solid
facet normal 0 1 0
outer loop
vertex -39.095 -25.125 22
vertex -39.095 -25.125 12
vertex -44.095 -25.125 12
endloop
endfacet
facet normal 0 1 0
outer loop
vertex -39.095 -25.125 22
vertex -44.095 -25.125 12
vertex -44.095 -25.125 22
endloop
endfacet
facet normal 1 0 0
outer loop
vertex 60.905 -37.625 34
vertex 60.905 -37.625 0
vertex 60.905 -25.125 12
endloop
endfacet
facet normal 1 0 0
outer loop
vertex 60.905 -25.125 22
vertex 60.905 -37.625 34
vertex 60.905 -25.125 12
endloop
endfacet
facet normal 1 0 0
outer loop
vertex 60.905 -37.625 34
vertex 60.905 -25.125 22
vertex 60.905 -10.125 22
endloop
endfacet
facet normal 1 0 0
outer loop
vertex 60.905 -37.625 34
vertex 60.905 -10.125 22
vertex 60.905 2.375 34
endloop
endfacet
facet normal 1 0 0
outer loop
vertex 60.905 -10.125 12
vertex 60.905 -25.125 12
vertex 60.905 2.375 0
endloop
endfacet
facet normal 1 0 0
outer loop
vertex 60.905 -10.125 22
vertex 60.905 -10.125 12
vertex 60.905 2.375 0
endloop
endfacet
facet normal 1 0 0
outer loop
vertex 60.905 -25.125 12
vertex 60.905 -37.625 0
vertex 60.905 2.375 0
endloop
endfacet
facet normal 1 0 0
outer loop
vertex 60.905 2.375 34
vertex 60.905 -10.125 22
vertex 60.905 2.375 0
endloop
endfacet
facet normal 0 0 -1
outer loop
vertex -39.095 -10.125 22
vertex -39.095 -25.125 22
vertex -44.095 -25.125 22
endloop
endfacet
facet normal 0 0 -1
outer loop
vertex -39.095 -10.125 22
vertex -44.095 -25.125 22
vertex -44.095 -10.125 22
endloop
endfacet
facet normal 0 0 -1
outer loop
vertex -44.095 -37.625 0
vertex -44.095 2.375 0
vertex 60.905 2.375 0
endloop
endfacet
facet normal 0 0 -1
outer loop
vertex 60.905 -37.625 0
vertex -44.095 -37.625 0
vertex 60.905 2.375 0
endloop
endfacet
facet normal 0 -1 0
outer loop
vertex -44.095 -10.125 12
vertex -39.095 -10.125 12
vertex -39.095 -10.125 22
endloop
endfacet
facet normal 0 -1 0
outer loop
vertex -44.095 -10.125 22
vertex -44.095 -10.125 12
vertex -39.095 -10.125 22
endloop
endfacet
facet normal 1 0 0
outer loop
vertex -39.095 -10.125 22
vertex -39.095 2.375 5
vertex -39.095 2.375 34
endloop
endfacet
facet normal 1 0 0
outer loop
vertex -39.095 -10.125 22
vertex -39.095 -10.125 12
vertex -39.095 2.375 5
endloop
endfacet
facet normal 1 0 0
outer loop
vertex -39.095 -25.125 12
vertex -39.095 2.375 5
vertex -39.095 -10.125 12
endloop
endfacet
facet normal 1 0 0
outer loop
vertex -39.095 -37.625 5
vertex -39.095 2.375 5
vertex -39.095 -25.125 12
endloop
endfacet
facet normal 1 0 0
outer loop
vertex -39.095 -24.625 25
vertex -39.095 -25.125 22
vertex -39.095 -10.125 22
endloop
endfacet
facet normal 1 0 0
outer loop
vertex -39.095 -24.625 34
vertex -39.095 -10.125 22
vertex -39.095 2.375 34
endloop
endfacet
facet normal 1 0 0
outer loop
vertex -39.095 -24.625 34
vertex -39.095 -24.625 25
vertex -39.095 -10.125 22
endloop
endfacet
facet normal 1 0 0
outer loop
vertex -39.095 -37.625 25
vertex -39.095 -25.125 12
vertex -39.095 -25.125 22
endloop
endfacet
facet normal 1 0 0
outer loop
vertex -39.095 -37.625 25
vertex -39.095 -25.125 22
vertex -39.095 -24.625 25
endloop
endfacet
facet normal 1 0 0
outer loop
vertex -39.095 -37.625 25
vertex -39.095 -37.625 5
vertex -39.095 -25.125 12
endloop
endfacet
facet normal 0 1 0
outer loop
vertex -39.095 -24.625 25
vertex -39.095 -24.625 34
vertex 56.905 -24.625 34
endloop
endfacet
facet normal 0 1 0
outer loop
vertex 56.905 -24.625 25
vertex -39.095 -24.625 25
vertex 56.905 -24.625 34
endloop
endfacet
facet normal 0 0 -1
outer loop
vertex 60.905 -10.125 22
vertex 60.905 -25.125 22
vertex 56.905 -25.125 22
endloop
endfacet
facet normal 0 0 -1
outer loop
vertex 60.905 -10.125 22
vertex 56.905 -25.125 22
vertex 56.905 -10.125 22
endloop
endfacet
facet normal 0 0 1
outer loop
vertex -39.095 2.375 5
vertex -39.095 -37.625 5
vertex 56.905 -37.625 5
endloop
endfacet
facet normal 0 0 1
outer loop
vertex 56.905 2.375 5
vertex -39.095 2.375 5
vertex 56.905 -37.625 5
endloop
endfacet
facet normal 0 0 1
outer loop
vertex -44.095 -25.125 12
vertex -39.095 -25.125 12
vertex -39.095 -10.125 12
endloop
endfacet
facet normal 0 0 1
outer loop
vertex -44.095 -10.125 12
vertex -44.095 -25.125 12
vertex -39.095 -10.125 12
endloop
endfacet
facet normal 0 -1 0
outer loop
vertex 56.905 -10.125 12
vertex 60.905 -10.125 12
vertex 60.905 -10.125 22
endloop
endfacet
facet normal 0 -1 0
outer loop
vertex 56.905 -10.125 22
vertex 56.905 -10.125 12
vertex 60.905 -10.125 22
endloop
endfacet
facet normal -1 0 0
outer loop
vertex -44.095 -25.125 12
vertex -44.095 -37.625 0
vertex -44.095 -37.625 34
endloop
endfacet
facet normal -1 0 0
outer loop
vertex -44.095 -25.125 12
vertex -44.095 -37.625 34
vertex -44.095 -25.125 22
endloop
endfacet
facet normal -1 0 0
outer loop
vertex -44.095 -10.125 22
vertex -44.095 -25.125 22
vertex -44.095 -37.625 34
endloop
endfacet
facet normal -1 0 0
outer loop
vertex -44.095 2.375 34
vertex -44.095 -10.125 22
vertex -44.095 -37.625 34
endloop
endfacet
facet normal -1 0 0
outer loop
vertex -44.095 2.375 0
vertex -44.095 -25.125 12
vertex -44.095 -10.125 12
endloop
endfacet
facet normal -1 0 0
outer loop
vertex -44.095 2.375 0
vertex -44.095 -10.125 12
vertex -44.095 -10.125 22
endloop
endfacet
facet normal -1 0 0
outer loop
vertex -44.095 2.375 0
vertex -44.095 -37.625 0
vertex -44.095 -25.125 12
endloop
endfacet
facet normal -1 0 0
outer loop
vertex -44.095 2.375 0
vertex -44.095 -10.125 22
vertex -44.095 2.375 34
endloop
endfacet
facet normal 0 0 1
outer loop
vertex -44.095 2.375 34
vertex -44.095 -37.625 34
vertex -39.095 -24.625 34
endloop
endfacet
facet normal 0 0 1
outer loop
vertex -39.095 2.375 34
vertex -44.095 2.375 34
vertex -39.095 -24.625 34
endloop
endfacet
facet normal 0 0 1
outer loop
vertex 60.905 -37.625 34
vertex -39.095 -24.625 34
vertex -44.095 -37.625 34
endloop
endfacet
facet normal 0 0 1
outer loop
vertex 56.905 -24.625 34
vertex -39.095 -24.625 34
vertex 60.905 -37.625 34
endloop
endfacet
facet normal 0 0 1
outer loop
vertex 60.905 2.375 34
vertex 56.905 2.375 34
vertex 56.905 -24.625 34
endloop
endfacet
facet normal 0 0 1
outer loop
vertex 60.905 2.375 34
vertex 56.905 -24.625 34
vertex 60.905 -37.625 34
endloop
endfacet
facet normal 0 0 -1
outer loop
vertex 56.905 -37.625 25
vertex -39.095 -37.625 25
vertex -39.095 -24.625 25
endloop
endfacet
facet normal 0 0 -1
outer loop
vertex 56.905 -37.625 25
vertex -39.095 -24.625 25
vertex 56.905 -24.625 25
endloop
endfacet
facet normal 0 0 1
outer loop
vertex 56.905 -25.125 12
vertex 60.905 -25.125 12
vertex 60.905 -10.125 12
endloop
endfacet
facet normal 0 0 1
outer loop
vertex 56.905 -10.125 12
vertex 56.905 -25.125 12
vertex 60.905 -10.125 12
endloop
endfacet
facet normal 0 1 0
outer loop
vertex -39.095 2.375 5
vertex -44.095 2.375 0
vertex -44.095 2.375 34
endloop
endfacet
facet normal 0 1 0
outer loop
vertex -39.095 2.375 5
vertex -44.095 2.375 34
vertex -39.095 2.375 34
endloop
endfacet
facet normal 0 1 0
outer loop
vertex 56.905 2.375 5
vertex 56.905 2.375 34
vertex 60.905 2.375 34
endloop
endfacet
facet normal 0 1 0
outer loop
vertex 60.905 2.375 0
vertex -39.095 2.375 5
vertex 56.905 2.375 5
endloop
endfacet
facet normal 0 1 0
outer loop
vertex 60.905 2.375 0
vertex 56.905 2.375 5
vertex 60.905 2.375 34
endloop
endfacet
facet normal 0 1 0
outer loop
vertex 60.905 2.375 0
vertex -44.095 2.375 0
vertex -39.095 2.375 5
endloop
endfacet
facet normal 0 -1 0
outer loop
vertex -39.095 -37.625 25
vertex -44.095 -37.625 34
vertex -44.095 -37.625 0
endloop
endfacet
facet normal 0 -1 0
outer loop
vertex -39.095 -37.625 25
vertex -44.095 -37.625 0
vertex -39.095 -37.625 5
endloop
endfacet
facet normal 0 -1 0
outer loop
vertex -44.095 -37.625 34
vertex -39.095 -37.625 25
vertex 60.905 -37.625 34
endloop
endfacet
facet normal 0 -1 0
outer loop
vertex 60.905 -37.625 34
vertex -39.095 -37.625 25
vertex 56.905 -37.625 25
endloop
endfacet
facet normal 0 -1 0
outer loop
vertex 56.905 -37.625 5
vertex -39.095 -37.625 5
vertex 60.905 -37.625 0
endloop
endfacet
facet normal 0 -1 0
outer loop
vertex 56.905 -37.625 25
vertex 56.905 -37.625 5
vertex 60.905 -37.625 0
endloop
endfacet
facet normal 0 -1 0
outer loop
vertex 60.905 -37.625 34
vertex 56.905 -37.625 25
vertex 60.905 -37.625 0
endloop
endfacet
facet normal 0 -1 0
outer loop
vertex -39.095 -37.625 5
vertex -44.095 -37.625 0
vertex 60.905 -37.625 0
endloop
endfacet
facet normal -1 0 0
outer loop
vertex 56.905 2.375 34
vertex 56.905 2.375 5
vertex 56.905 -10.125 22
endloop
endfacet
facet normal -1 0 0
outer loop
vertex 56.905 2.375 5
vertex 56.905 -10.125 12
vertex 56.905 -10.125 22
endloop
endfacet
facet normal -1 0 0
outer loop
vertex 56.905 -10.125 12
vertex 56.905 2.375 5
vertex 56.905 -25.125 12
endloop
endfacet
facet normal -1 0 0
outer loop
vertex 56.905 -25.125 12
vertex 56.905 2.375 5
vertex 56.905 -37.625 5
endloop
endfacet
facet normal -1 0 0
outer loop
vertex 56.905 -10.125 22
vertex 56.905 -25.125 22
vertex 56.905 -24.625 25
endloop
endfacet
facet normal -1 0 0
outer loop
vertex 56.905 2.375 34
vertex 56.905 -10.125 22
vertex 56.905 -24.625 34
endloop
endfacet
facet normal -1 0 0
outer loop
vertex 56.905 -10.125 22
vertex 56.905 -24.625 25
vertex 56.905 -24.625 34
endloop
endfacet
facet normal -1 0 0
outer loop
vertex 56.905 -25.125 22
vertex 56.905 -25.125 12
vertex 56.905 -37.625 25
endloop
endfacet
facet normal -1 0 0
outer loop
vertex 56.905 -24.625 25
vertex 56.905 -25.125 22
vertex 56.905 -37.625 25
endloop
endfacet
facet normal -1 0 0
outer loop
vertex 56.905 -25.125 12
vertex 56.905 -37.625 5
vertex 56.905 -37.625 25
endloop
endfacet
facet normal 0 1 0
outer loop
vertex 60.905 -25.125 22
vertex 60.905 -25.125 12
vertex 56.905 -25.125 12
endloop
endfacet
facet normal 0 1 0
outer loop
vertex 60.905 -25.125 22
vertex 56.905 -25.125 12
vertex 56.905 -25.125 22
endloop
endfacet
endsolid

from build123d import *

# Parameters (mm, degrees)
F0_W     = 105
F0_H     = 40
F1_DEPTH = 34
F2_W     = 96
F2_H     = 20
F3_DEPTH = 40.001
F4_W     = 96
F4_H     = 27
F5_DEPTH = 10
F6_W     = 15
F6_H     = 10
F7_DEPTH = 105.001


with BuildPart() as f1:
    # F0 (on Top) → F1 (new body)
    with BuildSketch(Plane.XY):
        with Locations((8.404606, -17.624996)):
            Rectangle(F0_W, F0_H)
    extrude(amount=F1_DEPTH)

    # F2 (on face) → F3 (cut, through all)
    with BuildSketch(Plane.XZ.offset(37.624996)):
        with Locations((8.904606, 15)):
            Rectangle(F2_W, F2_H)
    extrude(amount=-F3_DEPTH, mode=Mode.SUBTRACT)

    # F4 (on face) → F5 (cut)
    with BuildSketch(Plane.XY.offset(34)):
        with Locations((8.904606, -11.124996)):
            Rectangle(F4_W, F4_H)
    extrude(amount=-F5_DEPTH, mode=Mode.SUBTRACT)

    # F6 (on face) → F7 (cut, through all)
    with BuildSketch(Plane.YZ.offset(60.904606)):
        with Locations((-17.624996, 17)):
            Rectangle(F6_W, F6_H)
    extrude(amount=-F7_DEPTH, mode=Mode.SUBTRACT)


solid = f1.part
